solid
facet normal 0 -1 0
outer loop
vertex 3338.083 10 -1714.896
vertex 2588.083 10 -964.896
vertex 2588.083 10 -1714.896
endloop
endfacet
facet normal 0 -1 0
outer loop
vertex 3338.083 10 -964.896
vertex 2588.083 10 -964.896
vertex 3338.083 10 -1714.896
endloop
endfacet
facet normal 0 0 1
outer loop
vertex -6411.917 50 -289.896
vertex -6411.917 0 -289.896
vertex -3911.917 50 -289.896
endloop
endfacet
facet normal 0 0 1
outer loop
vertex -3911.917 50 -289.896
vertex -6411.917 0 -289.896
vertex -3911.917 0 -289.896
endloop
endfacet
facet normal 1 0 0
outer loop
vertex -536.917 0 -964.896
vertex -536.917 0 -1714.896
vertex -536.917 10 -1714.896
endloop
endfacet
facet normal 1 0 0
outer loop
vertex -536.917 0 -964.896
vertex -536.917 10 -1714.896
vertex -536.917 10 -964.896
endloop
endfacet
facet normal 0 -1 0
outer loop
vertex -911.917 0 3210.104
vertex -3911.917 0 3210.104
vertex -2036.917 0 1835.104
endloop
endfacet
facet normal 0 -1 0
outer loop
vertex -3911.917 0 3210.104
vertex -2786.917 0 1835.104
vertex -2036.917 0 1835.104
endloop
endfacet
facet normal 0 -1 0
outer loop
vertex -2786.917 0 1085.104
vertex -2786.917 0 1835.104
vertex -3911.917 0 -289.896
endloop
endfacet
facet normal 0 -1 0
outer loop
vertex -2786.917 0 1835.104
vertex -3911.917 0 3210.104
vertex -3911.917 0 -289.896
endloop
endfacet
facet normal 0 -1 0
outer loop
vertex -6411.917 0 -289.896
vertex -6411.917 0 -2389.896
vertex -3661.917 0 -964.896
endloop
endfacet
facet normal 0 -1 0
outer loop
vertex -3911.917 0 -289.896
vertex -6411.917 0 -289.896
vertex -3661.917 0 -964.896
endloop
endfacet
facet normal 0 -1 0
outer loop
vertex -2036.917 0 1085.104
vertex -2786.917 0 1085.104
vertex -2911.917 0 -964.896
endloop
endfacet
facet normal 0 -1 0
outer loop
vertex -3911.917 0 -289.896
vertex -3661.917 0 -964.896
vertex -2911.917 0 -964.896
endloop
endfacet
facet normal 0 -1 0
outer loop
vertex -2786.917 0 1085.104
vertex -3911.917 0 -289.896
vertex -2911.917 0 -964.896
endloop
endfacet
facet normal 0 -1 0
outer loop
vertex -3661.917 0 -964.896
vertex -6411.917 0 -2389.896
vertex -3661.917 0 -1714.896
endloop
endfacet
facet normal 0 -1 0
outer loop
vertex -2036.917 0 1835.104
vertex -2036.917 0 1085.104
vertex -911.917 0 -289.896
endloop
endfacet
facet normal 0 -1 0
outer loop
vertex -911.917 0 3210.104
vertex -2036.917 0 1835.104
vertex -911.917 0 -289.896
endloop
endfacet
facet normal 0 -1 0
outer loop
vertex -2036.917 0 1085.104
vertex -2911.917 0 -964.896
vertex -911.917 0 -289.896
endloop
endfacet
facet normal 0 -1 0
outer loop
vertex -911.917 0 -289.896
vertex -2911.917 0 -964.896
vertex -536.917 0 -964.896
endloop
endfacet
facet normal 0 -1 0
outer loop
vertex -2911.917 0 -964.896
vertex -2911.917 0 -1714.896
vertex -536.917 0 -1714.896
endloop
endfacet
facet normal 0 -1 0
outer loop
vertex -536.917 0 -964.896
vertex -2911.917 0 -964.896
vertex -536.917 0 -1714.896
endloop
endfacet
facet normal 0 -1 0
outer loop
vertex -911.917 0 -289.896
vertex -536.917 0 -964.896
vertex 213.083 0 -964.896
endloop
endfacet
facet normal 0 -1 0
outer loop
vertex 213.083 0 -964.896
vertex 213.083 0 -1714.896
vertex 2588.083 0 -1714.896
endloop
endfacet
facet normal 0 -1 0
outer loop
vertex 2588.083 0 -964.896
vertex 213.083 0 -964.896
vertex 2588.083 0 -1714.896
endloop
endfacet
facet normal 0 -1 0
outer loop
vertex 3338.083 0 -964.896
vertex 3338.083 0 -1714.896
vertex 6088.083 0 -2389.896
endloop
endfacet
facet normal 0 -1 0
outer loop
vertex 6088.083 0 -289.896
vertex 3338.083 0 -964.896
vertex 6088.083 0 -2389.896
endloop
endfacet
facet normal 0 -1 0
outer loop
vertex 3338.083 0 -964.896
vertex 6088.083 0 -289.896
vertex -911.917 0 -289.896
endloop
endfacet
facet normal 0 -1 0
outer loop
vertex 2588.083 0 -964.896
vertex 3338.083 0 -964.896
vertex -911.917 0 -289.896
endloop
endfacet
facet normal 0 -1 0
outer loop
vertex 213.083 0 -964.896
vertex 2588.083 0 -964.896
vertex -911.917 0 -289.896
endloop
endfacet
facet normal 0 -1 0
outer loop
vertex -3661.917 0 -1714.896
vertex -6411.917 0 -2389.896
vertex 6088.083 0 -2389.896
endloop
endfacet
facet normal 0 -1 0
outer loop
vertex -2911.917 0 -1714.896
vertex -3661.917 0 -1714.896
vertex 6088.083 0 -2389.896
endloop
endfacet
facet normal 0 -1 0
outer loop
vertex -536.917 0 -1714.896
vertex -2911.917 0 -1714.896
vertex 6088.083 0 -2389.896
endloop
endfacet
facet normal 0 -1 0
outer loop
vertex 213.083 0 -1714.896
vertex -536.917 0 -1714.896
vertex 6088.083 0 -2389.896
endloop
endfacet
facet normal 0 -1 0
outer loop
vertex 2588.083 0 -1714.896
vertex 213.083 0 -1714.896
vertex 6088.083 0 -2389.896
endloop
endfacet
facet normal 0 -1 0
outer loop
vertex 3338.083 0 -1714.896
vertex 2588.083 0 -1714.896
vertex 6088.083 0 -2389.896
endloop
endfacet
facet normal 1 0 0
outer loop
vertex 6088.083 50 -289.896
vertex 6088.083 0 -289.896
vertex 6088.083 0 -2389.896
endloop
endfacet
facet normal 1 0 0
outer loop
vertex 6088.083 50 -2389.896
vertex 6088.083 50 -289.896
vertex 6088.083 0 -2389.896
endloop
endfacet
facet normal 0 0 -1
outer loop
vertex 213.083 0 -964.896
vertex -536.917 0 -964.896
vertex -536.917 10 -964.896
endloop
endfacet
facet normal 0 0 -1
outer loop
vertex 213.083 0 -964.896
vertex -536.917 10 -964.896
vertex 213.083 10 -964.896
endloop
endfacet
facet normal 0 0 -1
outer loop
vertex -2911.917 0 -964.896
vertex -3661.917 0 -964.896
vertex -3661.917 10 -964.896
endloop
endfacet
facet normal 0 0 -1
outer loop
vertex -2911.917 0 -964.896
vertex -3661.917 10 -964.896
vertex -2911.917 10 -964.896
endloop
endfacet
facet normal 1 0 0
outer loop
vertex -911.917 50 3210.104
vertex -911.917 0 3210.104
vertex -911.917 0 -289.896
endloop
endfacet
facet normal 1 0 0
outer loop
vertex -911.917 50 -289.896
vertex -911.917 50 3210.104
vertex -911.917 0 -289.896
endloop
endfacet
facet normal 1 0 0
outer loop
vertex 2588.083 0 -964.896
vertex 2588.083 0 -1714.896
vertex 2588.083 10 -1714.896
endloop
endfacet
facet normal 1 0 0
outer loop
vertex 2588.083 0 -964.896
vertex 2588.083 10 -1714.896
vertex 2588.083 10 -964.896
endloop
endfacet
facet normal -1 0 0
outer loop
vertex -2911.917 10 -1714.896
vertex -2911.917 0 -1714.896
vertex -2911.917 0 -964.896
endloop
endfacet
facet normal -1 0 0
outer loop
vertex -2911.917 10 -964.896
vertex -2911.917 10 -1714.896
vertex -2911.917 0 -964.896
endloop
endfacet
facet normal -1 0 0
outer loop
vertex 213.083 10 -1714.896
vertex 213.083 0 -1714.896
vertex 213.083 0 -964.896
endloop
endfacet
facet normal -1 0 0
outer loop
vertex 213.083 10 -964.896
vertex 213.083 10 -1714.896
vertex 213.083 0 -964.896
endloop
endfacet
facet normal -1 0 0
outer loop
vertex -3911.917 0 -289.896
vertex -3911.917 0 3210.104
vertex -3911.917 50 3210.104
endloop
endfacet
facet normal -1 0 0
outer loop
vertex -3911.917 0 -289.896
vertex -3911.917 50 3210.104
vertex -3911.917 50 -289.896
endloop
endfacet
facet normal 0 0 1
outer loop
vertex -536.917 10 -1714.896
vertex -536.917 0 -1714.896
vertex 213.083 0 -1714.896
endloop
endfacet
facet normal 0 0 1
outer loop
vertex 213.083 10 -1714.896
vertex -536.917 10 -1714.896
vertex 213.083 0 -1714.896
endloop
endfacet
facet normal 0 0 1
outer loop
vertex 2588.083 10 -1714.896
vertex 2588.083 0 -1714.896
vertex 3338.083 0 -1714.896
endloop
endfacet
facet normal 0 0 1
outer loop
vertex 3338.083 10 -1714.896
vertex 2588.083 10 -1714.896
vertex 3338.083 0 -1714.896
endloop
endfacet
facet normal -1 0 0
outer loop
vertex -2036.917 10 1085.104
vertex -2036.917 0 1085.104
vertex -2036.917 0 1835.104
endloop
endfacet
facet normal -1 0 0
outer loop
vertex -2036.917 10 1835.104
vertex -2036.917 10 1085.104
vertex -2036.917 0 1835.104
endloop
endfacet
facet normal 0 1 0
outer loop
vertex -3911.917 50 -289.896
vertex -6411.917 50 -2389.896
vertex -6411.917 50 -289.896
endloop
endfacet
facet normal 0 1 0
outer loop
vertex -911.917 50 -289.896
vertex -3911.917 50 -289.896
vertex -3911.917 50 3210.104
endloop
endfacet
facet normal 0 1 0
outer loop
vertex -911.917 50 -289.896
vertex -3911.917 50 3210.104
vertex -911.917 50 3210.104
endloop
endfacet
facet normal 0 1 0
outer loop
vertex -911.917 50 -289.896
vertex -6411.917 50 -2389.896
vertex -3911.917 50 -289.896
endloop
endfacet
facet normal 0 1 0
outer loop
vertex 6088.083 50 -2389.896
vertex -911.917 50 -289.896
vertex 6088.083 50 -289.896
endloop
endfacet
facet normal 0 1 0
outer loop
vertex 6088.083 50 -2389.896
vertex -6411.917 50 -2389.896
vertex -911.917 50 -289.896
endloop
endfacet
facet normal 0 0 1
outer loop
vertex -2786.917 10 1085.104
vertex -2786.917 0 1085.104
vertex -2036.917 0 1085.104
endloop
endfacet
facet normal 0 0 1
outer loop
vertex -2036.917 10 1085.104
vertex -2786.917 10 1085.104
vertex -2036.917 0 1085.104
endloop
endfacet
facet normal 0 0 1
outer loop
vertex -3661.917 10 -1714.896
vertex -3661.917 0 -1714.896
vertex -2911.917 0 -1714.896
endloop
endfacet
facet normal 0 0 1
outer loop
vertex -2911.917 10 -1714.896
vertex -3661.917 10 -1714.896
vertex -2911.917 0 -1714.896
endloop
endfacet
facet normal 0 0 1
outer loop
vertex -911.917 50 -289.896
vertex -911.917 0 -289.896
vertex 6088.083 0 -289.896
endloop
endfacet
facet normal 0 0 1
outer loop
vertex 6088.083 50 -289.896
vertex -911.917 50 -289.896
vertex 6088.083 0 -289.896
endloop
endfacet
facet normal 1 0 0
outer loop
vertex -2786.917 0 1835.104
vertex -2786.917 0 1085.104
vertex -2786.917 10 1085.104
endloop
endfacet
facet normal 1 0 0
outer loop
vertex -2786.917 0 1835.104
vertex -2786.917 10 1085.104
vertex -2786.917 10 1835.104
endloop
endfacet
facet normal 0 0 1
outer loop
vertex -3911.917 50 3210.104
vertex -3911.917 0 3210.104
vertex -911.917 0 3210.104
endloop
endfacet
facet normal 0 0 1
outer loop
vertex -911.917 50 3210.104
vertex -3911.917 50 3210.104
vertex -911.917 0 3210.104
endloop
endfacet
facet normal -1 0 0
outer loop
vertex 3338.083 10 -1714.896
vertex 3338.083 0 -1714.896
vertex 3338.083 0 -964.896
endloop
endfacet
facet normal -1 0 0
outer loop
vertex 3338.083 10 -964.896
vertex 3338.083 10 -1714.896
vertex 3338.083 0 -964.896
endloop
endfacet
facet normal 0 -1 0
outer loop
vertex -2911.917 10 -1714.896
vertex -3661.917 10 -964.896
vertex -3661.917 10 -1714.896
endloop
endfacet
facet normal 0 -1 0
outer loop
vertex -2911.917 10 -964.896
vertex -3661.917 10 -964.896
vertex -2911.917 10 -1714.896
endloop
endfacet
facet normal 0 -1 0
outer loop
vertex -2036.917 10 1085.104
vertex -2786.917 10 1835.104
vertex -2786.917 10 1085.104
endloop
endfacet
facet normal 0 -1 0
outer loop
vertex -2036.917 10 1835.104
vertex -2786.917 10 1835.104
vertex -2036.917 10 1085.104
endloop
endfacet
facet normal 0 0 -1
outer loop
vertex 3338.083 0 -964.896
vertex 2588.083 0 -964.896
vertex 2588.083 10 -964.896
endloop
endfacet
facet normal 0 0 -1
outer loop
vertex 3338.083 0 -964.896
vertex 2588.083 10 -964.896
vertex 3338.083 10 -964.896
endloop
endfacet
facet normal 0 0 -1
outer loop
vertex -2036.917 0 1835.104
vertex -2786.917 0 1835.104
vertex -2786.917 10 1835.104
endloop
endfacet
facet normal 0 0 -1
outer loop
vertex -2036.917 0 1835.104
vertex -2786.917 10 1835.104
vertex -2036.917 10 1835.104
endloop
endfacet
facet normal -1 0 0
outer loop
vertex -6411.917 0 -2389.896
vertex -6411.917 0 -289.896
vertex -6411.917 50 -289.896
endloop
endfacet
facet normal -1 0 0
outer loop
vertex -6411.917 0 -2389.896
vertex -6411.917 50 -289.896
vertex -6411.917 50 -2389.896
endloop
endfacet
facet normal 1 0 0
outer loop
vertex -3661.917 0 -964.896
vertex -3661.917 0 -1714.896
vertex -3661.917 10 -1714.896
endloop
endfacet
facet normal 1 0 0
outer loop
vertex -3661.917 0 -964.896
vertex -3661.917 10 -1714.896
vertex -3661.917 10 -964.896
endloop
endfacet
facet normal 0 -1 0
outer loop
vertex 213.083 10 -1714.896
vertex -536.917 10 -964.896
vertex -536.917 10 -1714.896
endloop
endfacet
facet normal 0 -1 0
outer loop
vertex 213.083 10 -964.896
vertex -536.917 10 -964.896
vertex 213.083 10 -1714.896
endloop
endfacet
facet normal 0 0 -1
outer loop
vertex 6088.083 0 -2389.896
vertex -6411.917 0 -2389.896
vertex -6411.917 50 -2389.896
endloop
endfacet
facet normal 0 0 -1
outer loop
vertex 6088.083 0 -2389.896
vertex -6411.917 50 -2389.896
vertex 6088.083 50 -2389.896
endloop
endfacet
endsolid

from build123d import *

# Parameters (mm, degrees)
SKETCH1_W           = 12500
SKETCH1_H           = 2100
SKETCH1_W_2         = 3000
SKETCH1_H_2         = 3500
BOSS_EXTRUDE1_DEPTH = 50
SKETCH2_W           = 750
SKETCH2_H           = 750
CUT_EXTRUDE1_DEPTH  = 10


with BuildPart() as part:
    # Sketch1 → Boss-Extrude1 (new body)
    with BuildSketch(Plane(origin=(0, 0, 0), x_dir=(1, 0, 0), z_dir=(0, 1, 0))):
        with Locations((-161.917098446, 1339.896373057)):
            Rectangle(SKETCH1_W, SKETCH1_H)
        with Locations((-2411.917098446, -1460.103626943)):
            Rectangle(SKETCH1_W_2, SKETCH1_H_2)
    extrude(amount=BOSS_EXTRUDE1_DEPTH)

    # Sketch2 → Cut-Extrude1 (cut)
    with BuildSketch(Plane.XZ):
        with Locations((-2411.917098446, 1460.103626943)):
            Rectangle(SKETCH2_W, SKETCH2_H)
        with Locations((-3286.917098446, -1339.896373057)):
            Rectangle(SKETCH2_W, SKETCH2_H)
        with Locations((-161.917098446, -1339.896373057)):
            Rectangle(SKETCH2_W, SKETCH2_H)
        with Locations((2963.082901554, -1339.896373057)):
            Rectangle(SKETCH2_W, SKETCH2_H)
    extrude(amount=-CUT_EXTRUDE1_DEPTH, mode=Mode.SUBTRACT)


solid = part.part
